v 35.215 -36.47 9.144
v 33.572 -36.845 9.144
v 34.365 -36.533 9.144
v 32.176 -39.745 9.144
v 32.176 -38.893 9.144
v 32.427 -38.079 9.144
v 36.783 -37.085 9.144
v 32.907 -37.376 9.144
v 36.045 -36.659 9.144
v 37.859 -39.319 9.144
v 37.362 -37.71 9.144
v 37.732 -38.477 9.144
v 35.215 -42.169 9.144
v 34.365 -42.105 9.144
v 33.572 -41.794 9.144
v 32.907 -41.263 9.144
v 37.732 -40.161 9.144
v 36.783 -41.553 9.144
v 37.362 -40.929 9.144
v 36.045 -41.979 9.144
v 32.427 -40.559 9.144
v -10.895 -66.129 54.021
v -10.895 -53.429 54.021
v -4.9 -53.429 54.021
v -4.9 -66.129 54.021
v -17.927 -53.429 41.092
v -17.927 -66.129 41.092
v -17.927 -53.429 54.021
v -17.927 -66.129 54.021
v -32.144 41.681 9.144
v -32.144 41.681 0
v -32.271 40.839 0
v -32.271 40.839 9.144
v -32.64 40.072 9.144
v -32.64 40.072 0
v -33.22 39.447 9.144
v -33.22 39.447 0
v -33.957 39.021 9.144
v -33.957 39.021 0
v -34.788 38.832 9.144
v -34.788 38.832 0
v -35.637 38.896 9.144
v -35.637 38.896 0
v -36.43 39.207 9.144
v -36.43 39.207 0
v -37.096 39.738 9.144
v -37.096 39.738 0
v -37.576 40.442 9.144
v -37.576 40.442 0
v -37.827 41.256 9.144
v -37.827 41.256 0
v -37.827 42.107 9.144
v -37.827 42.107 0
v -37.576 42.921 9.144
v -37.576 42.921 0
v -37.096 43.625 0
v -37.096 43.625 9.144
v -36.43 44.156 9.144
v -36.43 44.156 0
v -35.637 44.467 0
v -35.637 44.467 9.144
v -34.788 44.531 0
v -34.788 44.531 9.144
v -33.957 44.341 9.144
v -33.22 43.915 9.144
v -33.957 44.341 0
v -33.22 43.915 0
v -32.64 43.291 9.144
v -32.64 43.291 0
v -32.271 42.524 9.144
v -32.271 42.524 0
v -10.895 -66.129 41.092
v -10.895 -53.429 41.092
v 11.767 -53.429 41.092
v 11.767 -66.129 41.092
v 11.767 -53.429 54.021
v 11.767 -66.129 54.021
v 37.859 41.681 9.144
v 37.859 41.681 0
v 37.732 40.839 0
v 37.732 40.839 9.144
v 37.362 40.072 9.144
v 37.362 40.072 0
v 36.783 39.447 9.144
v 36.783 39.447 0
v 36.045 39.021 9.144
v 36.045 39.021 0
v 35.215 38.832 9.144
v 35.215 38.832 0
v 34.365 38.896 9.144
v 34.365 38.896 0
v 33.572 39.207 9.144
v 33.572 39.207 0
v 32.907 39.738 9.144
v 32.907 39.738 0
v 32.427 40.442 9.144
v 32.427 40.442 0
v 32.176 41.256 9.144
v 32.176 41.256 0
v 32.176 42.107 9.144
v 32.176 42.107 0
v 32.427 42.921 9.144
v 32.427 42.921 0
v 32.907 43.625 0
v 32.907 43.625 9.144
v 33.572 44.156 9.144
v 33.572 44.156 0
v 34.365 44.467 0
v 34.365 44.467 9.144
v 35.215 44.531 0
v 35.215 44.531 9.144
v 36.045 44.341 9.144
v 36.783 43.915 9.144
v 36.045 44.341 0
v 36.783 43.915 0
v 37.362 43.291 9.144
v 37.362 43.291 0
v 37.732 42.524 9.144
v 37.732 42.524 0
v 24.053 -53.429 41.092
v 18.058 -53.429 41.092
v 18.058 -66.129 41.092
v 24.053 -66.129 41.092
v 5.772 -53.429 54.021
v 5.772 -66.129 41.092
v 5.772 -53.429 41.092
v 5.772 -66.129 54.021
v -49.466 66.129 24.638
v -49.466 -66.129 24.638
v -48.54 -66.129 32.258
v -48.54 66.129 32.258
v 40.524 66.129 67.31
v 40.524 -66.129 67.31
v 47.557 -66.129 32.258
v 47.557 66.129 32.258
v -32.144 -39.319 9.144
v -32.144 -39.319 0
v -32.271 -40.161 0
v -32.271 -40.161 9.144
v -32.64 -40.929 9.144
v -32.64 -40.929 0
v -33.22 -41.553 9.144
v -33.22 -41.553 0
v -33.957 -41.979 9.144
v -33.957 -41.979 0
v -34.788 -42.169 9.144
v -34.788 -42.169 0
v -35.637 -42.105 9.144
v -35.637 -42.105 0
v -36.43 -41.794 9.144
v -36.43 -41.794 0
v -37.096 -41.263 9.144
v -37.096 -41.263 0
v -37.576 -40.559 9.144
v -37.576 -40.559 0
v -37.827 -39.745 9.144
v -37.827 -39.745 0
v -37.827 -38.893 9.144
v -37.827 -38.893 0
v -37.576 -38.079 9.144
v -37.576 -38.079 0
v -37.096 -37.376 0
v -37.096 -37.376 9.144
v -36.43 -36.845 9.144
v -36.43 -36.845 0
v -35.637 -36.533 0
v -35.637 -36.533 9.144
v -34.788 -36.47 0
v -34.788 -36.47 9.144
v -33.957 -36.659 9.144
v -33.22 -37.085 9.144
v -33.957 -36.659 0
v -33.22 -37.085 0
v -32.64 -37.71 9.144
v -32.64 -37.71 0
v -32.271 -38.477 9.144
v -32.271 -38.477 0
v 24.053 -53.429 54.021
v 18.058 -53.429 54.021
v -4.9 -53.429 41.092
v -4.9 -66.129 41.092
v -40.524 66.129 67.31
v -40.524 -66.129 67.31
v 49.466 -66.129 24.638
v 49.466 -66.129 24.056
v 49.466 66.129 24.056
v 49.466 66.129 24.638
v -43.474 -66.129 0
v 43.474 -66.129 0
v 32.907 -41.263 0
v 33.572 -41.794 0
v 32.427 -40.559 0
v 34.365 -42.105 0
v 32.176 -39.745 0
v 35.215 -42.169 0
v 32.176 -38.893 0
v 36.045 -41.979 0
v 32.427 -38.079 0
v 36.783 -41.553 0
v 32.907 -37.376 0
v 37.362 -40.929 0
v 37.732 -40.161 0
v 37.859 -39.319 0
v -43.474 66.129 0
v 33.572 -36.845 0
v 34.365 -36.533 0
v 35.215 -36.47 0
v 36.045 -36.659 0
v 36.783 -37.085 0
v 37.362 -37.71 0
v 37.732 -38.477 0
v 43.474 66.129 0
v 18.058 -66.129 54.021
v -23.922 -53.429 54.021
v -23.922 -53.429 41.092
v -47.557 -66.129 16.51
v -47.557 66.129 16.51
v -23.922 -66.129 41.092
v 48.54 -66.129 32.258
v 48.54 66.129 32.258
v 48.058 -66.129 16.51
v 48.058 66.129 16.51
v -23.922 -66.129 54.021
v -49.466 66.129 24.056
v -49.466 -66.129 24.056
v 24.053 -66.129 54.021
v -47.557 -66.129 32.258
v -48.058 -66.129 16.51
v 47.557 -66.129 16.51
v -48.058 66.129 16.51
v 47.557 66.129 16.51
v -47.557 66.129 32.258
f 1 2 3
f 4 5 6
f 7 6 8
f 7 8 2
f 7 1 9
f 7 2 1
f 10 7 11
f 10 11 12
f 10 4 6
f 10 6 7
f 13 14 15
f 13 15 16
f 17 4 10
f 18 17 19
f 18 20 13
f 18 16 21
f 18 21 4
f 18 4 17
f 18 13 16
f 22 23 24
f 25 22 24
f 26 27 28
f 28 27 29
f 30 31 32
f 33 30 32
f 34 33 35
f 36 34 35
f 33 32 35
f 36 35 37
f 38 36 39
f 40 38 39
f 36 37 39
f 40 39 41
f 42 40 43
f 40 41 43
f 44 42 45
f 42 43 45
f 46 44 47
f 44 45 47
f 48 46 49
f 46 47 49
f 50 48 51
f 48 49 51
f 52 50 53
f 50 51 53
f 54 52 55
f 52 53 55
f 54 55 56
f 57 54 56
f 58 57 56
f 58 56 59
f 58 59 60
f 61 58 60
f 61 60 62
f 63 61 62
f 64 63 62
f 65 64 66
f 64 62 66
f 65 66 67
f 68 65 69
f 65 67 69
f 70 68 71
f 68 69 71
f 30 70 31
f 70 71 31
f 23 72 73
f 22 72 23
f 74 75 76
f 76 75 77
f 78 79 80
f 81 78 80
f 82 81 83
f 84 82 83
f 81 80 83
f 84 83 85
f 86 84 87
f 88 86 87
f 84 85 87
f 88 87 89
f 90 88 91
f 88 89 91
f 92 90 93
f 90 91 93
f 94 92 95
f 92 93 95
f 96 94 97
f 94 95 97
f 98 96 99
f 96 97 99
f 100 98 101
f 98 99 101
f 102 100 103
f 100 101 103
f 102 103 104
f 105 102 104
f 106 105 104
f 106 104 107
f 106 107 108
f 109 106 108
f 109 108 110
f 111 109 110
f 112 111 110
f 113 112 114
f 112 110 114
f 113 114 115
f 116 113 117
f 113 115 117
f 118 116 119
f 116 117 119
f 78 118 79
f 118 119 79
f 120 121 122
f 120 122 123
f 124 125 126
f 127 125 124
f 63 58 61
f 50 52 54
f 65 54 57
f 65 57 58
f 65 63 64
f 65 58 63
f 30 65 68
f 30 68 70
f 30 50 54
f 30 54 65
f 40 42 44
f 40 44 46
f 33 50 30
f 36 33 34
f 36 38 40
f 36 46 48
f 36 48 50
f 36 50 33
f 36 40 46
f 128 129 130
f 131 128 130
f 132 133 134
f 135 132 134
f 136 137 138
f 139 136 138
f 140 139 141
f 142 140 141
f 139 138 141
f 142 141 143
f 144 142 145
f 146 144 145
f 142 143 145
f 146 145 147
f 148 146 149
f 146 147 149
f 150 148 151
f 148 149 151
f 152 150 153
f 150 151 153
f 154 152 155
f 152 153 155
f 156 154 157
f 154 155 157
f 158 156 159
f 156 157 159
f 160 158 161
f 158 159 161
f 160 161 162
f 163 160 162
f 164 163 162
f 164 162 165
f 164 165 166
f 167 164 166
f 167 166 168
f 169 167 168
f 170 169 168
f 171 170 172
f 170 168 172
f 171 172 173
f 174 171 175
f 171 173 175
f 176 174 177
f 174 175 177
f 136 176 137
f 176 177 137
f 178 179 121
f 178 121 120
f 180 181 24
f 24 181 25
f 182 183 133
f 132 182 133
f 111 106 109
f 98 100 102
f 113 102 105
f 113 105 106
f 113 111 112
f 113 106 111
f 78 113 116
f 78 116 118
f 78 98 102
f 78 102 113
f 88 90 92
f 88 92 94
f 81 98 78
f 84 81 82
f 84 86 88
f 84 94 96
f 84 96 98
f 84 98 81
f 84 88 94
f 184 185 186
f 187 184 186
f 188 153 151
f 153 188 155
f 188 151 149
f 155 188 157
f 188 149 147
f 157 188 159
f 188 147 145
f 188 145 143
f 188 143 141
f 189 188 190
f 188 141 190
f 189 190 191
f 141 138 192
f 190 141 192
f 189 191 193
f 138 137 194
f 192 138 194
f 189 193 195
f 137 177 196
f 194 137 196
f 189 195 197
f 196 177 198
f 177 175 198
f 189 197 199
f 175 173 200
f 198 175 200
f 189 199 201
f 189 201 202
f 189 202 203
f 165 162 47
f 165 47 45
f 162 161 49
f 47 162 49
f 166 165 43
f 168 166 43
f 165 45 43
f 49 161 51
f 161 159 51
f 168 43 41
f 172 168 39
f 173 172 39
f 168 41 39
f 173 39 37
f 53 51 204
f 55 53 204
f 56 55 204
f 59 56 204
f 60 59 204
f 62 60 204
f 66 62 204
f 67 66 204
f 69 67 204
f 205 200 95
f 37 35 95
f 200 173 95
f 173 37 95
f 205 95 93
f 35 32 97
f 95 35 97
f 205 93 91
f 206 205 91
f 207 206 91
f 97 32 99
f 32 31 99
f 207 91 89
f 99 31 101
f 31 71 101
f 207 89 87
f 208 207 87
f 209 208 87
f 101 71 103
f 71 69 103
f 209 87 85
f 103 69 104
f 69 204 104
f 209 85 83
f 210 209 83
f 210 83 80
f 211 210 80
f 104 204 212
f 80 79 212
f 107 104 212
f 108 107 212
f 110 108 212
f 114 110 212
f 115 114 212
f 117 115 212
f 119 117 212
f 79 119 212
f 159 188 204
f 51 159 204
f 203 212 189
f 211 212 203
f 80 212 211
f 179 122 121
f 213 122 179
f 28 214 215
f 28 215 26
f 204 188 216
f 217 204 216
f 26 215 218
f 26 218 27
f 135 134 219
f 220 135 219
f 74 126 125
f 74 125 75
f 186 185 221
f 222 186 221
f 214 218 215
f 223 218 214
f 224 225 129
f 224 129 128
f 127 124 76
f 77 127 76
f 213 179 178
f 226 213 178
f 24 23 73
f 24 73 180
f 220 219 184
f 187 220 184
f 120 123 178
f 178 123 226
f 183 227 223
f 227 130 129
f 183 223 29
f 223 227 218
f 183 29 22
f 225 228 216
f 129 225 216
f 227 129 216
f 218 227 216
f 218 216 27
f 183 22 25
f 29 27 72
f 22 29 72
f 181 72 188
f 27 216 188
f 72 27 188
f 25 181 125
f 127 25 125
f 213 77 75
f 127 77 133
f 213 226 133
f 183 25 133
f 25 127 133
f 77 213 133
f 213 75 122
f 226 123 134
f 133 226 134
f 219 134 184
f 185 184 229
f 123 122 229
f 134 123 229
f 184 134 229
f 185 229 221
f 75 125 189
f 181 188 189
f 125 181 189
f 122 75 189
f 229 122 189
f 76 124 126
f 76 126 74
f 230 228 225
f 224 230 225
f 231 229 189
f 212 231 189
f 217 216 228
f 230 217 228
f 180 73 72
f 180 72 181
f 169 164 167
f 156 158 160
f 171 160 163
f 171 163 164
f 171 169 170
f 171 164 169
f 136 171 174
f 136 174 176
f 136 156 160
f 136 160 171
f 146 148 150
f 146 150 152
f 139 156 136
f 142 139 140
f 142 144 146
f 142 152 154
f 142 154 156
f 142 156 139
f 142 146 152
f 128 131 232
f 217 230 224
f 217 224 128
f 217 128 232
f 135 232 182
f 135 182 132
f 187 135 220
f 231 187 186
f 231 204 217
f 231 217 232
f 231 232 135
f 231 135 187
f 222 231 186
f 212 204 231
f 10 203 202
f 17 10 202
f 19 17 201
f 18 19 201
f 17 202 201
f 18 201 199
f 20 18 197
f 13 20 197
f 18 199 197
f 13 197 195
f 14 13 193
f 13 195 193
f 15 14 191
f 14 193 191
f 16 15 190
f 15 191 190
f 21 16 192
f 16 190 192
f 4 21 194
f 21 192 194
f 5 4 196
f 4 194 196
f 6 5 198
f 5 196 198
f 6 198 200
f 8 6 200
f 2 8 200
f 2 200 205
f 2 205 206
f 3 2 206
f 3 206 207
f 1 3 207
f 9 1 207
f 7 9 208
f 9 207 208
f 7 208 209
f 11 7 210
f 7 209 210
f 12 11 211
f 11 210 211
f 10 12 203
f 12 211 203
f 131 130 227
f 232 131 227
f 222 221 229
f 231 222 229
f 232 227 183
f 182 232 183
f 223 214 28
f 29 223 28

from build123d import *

# Parameters (mm, degrees)
F0_W     = 98.933
F0_H     = 132.2578
F1_DEPTH = 67.31
F3_DEPTH = 132.2578
F4_W     = 5.994986
F4_H     = 12.929627
F5_DEPTH = 12.7
F6_R     = 2.8575
F7_DEPTH = 9.144


with BuildPart() as f1:
    # F0 (on Top) → F1 (new body)
    with BuildSketch(Plane.XY):
        Rectangle(F0_W, F0_H)
    extrude(amount=F1_DEPTH)

    # F2 (on face) → F3 (cut, through all)
    with BuildSketch(Plane.XZ.offset(66.1289)):
        Polygon((-47.556915, 32.258), (-40.523797, 67.31), (-49.4665, 67.31), (-49.4665, 24.638), (-48.539754, 32.258), align=None)
        Polygon((-48.057587, 16.51), (-49.4665, 24.055742), (-49.4665, 0), (-43.474339, 0), (-47.556915, 16.51), align=None)
        Polygon((49.4665, 0), (49.4665, 24.055742), (48.057587, 16.51), (47.556915, 16.51), (43.474339, 0), align=None)
        Polygon((49.4665, 67.31), (40.523797, 67.31), (47.556915, 32.258), (48.539754, 32.258), (49.4665, 24.638), align=None)
    extrude(amount=-F3_DEPTH, mode=Mode.SUBTRACT)

    # F4 (on face) → F5 (cut)
    with BuildSketch(Plane.XZ.offset(66.1289)):
        with Locations((-20.924805, 47.556382)):
            Rectangle(F4_W, F4_H)
        with Locations((-7.897241, 47.556382)):
            Rectangle(F4_W, F4_H)
        with Locations((8.76972, 47.556382)):
            Rectangle(F4_W, F4_H)
        with Locations((21.055504, 47.556382)):
            Rectangle(F4_W, F4_H)
    extrude(amount=-F5_DEPTH, mode=Mode.SUBTRACT)

    # F6 (on face) → F7 (cut)
    with BuildSketch(Plane(origin=(0, 0, 0), x_dir=(1, 0, 0), z_dir=(0, 0, -1))):
        with Locations((-35.0012, -41.6814)):
            Circle(F6_R)
        with Locations((35.0012, -41.6814)):
            Circle(F6_R)
        with Locations((35.0012, 39.3192)):
            Circle(F6_R)
        with Locations((-35.0012, 39.3192)):
            Circle(F6_R)
    extrude(amount=-F7_DEPTH, mode=Mode.SUBTRACT)


solid = f1.part
